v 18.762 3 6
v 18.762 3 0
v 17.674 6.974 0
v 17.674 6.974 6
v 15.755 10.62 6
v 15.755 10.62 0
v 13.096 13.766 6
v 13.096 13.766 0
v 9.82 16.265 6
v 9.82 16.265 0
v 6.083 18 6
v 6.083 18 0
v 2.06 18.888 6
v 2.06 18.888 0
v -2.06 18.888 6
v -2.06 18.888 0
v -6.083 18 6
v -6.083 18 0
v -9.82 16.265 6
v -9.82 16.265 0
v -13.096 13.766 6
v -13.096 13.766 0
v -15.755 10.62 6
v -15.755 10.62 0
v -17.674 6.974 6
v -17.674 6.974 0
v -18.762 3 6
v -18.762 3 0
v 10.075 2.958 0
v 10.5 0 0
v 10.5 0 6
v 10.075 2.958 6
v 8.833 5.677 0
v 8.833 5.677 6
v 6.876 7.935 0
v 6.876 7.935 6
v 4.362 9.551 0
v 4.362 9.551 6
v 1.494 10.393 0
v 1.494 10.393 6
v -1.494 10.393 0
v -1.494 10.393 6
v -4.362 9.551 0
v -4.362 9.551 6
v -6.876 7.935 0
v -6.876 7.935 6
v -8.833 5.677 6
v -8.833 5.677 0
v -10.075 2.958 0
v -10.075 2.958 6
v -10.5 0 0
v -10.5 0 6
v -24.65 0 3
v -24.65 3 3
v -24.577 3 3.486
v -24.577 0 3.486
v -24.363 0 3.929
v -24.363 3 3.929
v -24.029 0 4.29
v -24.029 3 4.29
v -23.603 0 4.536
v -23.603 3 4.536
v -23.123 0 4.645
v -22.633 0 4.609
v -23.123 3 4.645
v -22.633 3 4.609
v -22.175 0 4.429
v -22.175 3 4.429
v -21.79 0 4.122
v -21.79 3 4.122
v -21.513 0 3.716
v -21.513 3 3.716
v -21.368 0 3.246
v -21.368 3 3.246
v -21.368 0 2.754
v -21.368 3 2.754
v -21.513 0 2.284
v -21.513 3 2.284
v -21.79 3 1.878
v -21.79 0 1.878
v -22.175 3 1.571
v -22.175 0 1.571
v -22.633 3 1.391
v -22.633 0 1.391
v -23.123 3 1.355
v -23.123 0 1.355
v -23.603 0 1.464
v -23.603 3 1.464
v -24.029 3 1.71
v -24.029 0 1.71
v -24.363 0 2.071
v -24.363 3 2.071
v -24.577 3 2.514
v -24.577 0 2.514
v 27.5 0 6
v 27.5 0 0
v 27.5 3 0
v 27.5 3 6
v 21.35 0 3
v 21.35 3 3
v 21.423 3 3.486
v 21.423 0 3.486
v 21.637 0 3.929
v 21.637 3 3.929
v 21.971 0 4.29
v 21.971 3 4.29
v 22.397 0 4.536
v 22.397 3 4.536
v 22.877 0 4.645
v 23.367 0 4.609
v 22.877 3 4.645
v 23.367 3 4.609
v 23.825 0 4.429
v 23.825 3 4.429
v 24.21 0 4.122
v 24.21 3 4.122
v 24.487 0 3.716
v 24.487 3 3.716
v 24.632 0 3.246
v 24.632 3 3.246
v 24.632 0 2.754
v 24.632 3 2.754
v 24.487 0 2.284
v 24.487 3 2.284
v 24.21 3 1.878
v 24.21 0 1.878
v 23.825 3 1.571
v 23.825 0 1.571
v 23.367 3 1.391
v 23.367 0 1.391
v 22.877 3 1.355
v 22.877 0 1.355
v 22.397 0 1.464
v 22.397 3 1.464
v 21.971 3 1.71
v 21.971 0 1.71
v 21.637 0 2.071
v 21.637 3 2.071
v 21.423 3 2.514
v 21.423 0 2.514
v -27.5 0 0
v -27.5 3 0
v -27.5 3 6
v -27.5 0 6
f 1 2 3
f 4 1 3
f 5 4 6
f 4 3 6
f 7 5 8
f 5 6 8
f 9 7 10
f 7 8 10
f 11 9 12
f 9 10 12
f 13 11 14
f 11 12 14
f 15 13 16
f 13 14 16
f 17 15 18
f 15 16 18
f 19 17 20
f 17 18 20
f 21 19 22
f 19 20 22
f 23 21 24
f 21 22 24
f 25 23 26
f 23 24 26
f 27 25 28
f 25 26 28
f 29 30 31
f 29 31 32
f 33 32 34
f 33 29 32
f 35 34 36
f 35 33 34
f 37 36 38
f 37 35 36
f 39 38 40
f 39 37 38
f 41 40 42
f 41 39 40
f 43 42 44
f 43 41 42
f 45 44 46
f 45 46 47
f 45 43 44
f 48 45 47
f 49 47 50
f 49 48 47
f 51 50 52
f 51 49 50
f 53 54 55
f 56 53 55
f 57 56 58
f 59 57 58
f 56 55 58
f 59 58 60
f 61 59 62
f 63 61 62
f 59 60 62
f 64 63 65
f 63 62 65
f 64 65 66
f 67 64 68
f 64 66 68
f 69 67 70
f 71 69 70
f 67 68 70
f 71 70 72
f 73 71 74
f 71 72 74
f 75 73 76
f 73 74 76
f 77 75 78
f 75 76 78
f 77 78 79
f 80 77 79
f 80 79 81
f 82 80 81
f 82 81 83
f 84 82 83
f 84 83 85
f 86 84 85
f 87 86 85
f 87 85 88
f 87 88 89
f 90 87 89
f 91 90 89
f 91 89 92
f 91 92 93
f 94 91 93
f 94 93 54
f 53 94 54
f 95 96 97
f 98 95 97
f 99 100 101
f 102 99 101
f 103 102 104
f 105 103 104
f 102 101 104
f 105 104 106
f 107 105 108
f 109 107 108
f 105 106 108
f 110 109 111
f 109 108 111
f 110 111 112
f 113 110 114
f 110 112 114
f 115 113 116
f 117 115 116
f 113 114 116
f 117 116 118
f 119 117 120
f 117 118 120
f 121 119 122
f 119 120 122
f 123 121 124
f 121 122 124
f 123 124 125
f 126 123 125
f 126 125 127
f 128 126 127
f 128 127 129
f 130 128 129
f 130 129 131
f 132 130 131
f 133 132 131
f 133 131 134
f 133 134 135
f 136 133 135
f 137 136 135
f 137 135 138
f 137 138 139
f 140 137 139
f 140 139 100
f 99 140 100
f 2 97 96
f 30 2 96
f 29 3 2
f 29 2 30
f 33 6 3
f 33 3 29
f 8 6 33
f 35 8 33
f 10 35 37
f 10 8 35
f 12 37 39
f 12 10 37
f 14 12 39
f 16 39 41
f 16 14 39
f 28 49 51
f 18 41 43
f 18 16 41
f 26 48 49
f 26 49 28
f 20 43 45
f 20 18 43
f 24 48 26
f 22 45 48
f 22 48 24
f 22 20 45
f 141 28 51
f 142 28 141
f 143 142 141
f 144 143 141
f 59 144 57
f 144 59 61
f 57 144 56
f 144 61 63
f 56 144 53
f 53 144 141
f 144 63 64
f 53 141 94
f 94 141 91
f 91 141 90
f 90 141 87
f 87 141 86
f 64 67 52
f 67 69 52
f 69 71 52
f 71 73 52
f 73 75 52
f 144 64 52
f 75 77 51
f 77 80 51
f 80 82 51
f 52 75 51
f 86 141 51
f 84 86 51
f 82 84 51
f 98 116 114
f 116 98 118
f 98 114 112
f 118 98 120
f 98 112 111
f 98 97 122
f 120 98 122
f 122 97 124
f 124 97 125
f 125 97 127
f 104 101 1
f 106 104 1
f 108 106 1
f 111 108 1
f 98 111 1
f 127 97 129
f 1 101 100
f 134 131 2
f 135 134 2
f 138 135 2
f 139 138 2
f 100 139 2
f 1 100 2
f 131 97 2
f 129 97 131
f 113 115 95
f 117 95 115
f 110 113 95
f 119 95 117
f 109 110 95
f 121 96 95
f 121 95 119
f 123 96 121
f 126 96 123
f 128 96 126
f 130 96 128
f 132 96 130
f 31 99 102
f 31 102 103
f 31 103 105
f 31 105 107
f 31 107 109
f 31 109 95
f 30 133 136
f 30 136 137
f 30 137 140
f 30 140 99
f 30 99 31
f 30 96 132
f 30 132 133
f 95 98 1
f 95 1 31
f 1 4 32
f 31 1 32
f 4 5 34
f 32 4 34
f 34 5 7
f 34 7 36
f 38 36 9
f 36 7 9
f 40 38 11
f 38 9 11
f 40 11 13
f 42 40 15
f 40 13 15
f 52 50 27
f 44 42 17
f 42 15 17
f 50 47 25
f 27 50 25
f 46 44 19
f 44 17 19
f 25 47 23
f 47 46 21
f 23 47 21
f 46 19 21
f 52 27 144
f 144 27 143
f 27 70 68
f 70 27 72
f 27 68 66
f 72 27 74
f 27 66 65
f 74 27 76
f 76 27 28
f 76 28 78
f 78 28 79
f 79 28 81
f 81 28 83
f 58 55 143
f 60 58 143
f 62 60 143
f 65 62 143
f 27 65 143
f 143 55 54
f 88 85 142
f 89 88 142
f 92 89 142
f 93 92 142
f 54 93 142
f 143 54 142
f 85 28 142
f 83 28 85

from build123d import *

# Parameters (mm, degrees)
PAD_DEPTH   = 6
SKETCH001_R = 1.65
HOLE_DEPTH  = 25


with BuildPart() as part:
    # Sketch → Pad (new body)
    with BuildSketch(Plane.XY):
        with BuildLine():
            ThreePointArc((10.5, 0), (0, 10.5), (-10.5, 0))
            Line((-27.5, 0), (-10.5, 0))
            Line((-27.5, 3), (-27.5, 0))
            Line((-18.761663, 3), (-27.5, 3))
            ThreePointArc((18.761663, 3), (0, 19), (-18.761663, 3))
            Line((27.5, 3), (18.761663, 3))
            Line((27.5, 0), (27.5, 3))
            Line((27.5, 0), (10.5, 0))
        make_face()
    extrude(amount=PAD_DEPTH)

    # Sketch001 (on Face5 of Pad) → Hole (cut)
    with BuildSketch(Plane(origin=(0, 3, 0), x_dir=(-1, 0, 0), z_dir=(0, 1, 0))):
        with Locations((-23, 3)):
            Circle(SKETCH001_R)
        with Locations((23, 3)):
            Circle(SKETCH001_R)
    extrude(amount=-HOLE_DEPTH, mode=Mode.SUBTRACT)


solid = part.part
